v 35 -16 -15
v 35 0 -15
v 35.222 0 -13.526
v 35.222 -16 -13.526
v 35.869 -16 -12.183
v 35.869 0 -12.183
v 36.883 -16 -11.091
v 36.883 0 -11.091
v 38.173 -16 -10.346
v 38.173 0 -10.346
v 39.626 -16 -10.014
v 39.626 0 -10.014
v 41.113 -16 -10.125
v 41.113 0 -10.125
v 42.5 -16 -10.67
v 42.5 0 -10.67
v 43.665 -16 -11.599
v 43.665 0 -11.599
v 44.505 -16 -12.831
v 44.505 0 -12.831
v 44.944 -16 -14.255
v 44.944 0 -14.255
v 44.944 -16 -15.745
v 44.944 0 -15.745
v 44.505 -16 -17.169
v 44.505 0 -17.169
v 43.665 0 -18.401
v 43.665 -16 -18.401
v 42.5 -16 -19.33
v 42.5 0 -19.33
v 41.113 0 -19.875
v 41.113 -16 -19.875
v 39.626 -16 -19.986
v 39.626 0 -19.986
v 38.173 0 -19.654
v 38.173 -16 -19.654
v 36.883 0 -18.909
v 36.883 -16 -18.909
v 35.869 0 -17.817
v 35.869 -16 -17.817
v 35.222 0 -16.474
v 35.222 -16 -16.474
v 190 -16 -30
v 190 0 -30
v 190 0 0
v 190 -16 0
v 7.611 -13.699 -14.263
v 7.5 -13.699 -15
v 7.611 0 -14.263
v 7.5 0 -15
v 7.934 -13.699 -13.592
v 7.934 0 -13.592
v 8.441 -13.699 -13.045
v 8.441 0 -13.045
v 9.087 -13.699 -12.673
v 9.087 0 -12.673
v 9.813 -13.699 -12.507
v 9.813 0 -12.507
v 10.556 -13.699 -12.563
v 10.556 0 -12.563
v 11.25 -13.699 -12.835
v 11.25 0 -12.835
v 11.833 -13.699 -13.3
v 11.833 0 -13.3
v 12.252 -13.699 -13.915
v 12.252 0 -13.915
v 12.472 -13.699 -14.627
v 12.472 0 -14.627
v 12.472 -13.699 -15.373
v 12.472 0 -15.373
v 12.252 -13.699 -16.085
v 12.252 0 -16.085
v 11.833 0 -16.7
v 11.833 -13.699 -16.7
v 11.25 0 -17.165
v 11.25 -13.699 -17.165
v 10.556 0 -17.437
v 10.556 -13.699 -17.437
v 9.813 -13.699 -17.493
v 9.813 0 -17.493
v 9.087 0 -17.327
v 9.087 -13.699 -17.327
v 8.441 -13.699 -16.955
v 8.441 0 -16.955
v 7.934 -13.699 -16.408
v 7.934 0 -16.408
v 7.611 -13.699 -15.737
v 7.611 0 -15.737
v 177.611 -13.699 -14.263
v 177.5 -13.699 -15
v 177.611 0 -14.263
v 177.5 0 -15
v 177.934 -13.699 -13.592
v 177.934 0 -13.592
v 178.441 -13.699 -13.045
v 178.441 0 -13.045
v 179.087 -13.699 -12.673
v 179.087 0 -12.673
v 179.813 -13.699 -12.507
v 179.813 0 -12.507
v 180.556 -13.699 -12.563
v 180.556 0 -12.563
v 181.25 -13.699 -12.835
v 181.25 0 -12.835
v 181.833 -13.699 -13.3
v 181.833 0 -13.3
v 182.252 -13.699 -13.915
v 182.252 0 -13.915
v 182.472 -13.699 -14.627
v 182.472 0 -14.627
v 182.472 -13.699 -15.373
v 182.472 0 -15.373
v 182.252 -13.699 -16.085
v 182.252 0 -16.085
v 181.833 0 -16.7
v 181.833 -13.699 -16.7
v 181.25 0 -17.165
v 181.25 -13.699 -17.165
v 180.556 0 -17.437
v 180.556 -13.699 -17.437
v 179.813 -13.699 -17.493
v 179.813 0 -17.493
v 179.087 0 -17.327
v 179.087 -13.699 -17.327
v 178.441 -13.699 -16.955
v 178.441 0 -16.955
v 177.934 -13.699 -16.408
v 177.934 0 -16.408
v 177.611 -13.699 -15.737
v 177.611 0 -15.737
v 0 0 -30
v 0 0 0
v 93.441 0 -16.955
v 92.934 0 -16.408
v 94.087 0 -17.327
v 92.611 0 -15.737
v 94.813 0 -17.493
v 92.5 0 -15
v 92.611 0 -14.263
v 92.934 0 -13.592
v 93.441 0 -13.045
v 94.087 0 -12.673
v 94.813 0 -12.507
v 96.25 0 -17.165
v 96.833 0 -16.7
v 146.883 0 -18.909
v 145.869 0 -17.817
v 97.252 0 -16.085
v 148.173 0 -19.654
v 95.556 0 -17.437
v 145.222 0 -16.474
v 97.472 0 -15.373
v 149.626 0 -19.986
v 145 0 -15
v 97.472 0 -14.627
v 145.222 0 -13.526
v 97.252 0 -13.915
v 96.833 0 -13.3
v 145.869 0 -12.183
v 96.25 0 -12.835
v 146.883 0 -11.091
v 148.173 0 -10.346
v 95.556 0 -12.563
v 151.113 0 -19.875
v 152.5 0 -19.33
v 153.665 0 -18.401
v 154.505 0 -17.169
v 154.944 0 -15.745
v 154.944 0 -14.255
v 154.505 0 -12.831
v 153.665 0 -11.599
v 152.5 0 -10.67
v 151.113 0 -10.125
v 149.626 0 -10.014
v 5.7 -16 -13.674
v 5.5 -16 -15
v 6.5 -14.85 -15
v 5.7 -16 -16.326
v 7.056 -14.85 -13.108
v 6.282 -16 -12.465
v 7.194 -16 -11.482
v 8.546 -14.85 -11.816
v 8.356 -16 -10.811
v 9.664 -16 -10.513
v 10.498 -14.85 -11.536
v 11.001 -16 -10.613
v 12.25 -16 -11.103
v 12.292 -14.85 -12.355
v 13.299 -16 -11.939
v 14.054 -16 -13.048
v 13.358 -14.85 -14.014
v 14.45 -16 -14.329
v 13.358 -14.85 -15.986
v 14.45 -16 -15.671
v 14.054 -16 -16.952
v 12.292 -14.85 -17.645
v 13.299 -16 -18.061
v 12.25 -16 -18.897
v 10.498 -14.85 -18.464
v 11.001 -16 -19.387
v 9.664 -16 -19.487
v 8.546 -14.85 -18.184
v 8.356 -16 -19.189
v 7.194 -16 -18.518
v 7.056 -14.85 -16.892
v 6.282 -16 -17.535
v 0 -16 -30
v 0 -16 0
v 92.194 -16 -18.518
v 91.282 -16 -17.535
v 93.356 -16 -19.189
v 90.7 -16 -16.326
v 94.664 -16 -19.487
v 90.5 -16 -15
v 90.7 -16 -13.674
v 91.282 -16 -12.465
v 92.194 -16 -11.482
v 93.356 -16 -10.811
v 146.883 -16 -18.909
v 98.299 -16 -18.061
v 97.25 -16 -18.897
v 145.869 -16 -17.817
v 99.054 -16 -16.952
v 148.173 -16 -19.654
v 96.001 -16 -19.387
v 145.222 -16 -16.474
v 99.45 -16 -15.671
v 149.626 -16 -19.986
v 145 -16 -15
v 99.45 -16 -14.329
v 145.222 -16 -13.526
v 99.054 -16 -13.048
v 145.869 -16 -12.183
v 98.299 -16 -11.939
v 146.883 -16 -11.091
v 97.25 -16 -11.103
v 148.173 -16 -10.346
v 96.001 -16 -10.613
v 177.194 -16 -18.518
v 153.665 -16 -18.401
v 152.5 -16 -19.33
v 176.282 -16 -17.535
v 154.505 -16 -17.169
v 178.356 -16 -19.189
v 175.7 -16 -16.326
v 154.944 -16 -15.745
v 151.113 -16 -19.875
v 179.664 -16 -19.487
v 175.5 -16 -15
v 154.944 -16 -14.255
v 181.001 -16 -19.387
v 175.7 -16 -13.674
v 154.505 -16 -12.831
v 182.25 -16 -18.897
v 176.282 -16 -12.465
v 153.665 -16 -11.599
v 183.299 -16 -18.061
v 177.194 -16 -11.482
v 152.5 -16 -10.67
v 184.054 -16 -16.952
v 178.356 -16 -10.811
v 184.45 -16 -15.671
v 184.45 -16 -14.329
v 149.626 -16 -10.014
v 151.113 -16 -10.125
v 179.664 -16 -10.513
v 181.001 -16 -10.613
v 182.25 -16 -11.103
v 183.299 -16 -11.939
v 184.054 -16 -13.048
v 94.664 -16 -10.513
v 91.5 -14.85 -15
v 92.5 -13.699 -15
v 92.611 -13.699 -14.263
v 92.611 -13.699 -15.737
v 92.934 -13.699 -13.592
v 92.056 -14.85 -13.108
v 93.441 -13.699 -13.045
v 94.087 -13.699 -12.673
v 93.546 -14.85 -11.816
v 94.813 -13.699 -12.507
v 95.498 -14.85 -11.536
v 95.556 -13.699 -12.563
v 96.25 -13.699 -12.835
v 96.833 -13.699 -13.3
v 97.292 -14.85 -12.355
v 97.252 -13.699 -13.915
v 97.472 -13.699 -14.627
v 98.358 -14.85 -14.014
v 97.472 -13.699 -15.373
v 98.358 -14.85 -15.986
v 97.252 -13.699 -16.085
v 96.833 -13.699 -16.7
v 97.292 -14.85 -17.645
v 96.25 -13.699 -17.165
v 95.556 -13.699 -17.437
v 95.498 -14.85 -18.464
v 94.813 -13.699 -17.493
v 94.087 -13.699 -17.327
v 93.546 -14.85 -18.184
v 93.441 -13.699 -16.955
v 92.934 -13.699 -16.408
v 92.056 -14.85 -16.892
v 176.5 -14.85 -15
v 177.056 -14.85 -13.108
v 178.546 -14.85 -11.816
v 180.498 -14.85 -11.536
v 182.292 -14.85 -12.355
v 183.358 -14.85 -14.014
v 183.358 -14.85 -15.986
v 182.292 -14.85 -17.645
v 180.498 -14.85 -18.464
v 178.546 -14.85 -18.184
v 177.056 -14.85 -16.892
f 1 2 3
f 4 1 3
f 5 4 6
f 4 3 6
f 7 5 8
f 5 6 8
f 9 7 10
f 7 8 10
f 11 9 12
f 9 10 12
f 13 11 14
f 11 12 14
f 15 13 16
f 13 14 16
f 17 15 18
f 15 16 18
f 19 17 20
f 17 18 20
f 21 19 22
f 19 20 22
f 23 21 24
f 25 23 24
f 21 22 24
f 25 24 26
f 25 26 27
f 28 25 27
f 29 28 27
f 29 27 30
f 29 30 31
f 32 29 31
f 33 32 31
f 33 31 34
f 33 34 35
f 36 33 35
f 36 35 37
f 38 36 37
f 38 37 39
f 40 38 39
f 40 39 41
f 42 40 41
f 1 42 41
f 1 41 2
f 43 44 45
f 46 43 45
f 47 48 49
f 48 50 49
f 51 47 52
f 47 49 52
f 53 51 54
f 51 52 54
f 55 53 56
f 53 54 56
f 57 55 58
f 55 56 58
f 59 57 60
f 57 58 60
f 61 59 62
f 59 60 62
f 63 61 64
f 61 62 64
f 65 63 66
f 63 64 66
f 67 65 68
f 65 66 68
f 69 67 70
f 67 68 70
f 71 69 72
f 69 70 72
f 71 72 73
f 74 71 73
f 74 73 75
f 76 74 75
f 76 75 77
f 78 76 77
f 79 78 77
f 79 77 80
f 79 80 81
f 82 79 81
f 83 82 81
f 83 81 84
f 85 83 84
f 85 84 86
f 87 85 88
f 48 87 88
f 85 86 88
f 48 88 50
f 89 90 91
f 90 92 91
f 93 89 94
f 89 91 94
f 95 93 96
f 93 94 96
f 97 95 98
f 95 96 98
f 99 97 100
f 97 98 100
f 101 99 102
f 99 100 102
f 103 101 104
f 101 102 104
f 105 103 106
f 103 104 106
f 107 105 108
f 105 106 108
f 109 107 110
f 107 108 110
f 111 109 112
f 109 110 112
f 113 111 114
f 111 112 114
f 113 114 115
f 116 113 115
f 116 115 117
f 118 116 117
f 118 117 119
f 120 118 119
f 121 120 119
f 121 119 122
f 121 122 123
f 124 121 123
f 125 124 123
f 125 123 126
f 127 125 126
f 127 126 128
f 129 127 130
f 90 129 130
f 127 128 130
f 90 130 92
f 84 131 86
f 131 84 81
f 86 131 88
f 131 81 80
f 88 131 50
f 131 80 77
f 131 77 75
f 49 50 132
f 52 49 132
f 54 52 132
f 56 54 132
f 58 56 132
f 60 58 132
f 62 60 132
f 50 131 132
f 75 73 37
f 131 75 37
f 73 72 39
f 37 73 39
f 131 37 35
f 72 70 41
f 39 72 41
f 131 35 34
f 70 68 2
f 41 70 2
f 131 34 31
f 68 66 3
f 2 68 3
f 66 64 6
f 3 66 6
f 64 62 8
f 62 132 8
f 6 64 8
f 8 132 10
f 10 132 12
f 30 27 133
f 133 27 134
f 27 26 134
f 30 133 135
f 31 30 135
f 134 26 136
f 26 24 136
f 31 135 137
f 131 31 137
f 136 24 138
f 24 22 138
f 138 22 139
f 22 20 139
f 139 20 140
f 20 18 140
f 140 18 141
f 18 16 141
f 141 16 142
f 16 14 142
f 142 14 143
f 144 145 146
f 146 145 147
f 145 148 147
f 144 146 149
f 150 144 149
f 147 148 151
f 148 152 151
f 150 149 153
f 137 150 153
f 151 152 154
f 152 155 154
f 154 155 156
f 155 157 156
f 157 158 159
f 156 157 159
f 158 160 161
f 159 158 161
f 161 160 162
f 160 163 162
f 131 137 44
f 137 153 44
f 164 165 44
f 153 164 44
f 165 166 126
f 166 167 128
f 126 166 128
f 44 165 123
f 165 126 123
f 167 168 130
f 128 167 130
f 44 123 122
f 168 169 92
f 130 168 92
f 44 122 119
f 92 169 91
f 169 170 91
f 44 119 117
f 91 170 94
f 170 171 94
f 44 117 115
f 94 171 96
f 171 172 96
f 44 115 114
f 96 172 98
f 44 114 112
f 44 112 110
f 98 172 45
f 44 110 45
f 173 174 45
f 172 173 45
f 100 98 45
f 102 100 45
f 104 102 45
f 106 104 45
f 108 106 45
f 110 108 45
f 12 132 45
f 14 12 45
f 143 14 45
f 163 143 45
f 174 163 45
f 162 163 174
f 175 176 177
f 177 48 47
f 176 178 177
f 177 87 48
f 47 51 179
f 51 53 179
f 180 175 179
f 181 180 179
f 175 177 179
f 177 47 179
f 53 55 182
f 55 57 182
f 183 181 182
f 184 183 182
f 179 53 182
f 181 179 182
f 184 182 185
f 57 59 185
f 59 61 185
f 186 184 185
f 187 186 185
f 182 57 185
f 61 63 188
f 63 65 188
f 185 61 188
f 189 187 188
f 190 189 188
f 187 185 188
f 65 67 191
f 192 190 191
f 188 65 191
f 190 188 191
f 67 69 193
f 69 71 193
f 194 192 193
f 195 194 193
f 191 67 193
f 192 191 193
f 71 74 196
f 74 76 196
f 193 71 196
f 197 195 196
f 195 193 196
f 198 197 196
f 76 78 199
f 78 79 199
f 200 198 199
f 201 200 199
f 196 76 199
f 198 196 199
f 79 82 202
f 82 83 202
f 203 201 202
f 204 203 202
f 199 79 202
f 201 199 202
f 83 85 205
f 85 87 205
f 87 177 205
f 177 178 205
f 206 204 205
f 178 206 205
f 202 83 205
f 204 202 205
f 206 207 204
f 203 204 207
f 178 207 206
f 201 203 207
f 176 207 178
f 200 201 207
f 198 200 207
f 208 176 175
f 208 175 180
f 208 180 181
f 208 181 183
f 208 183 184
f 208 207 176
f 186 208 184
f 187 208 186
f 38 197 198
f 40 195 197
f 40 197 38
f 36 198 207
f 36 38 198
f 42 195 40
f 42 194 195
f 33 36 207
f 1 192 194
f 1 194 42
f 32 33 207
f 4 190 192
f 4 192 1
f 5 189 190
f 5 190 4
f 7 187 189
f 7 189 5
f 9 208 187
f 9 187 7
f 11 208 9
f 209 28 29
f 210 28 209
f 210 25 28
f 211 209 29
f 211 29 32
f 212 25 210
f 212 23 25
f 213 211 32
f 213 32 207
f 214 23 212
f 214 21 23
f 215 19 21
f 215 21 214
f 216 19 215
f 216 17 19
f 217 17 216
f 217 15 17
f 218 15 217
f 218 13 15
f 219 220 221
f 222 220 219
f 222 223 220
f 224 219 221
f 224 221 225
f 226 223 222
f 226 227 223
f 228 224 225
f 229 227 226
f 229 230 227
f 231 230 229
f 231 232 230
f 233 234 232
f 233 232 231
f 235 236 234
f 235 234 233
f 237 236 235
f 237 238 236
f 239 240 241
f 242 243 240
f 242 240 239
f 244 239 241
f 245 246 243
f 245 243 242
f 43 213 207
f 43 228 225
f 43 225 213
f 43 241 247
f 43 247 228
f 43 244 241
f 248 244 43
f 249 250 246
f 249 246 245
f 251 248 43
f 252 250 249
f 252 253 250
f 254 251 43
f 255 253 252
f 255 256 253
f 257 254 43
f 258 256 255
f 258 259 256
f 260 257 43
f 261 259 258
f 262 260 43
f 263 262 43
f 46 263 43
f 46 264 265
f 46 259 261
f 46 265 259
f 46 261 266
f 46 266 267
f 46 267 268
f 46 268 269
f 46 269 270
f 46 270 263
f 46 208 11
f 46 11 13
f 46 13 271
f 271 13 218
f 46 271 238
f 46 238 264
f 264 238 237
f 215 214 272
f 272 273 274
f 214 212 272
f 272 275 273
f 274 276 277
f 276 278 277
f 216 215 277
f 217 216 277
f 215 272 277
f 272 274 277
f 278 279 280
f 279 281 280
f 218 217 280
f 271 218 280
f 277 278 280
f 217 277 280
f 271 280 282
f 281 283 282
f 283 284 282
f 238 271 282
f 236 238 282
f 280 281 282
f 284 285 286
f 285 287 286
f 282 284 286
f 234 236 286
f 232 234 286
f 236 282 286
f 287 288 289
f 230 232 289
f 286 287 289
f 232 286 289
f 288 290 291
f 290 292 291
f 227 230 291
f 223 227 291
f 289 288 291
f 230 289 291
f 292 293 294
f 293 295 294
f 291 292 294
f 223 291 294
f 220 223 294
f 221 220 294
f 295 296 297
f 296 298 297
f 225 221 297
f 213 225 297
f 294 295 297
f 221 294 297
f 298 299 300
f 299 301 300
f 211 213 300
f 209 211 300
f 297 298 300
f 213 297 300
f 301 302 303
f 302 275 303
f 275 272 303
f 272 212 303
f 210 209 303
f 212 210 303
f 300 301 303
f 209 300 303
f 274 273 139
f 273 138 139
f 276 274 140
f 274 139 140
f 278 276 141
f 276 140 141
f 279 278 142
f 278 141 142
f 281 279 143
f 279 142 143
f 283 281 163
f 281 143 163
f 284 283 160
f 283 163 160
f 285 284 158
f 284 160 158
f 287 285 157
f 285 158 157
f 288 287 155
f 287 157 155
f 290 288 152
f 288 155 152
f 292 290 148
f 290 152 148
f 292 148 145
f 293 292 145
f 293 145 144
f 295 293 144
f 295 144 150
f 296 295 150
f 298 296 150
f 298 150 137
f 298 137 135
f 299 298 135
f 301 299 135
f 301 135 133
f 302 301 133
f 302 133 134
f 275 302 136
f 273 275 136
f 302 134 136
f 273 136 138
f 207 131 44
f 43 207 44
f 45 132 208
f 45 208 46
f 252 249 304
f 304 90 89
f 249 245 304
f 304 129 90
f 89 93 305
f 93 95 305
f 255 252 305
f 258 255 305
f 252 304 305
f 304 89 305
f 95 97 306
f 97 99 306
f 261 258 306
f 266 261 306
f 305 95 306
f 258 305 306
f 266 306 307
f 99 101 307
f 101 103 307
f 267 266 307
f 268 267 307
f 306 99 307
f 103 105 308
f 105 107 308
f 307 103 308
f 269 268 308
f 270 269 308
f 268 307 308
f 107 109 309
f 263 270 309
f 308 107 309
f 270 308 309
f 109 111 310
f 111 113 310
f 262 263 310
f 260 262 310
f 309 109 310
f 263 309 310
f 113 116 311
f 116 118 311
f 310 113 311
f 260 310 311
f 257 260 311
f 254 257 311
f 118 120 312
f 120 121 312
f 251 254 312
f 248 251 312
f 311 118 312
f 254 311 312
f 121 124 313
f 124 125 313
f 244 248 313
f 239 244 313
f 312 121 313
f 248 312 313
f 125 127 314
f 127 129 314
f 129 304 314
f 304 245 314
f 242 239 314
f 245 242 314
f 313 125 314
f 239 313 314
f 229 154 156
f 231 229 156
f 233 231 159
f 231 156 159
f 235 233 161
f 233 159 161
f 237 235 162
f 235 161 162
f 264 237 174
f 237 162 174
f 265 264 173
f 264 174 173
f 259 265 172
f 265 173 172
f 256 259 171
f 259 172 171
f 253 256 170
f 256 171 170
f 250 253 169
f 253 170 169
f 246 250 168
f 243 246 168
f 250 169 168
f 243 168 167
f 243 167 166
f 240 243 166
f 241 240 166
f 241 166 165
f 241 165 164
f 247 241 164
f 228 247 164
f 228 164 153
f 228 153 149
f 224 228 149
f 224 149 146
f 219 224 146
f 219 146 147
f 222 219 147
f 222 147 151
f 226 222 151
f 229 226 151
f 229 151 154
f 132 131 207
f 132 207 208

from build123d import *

# Parameters (mm, degrees)
F0_W           = 190
F0_H           = 30
F1_DEPTH       = 16
F3_D           = 5
F3_CSINK_D     = 9
F3_CSINK_ANGLE = 82
F4_D           = 10
F6_D           = 10


with BuildPart() as f1:
    # F0 (on Front) → F1 (new body)
    with BuildSketch(Plane.XZ):
        with Locations((95, -15)):
            Rectangle(F0_W, F0_H)
    extrude(amount=F1_DEPTH)

    # F3 (through all)
    with Locations(Plane.XZ.offset(16)):
        with Locations((10, -15), (95, -15), (180, -15), (180, -15)):
            CounterSinkHole(F3_D / 2, F3_CSINK_D / 2, counter_sink_angle=F3_CSINK_ANGLE)

    # F4 (through all)
    with Locations(Plane.XZ.offset(16)):
        with Locations((40, -15), (156, -52.788887)):
            Hole(F4_D / 2)

    # F6 (through all)
    with Locations(Plane.XZ.offset(16)):
        with Locations((150, -15)):
            Hole(F6_D / 2)


solid = f1.part
